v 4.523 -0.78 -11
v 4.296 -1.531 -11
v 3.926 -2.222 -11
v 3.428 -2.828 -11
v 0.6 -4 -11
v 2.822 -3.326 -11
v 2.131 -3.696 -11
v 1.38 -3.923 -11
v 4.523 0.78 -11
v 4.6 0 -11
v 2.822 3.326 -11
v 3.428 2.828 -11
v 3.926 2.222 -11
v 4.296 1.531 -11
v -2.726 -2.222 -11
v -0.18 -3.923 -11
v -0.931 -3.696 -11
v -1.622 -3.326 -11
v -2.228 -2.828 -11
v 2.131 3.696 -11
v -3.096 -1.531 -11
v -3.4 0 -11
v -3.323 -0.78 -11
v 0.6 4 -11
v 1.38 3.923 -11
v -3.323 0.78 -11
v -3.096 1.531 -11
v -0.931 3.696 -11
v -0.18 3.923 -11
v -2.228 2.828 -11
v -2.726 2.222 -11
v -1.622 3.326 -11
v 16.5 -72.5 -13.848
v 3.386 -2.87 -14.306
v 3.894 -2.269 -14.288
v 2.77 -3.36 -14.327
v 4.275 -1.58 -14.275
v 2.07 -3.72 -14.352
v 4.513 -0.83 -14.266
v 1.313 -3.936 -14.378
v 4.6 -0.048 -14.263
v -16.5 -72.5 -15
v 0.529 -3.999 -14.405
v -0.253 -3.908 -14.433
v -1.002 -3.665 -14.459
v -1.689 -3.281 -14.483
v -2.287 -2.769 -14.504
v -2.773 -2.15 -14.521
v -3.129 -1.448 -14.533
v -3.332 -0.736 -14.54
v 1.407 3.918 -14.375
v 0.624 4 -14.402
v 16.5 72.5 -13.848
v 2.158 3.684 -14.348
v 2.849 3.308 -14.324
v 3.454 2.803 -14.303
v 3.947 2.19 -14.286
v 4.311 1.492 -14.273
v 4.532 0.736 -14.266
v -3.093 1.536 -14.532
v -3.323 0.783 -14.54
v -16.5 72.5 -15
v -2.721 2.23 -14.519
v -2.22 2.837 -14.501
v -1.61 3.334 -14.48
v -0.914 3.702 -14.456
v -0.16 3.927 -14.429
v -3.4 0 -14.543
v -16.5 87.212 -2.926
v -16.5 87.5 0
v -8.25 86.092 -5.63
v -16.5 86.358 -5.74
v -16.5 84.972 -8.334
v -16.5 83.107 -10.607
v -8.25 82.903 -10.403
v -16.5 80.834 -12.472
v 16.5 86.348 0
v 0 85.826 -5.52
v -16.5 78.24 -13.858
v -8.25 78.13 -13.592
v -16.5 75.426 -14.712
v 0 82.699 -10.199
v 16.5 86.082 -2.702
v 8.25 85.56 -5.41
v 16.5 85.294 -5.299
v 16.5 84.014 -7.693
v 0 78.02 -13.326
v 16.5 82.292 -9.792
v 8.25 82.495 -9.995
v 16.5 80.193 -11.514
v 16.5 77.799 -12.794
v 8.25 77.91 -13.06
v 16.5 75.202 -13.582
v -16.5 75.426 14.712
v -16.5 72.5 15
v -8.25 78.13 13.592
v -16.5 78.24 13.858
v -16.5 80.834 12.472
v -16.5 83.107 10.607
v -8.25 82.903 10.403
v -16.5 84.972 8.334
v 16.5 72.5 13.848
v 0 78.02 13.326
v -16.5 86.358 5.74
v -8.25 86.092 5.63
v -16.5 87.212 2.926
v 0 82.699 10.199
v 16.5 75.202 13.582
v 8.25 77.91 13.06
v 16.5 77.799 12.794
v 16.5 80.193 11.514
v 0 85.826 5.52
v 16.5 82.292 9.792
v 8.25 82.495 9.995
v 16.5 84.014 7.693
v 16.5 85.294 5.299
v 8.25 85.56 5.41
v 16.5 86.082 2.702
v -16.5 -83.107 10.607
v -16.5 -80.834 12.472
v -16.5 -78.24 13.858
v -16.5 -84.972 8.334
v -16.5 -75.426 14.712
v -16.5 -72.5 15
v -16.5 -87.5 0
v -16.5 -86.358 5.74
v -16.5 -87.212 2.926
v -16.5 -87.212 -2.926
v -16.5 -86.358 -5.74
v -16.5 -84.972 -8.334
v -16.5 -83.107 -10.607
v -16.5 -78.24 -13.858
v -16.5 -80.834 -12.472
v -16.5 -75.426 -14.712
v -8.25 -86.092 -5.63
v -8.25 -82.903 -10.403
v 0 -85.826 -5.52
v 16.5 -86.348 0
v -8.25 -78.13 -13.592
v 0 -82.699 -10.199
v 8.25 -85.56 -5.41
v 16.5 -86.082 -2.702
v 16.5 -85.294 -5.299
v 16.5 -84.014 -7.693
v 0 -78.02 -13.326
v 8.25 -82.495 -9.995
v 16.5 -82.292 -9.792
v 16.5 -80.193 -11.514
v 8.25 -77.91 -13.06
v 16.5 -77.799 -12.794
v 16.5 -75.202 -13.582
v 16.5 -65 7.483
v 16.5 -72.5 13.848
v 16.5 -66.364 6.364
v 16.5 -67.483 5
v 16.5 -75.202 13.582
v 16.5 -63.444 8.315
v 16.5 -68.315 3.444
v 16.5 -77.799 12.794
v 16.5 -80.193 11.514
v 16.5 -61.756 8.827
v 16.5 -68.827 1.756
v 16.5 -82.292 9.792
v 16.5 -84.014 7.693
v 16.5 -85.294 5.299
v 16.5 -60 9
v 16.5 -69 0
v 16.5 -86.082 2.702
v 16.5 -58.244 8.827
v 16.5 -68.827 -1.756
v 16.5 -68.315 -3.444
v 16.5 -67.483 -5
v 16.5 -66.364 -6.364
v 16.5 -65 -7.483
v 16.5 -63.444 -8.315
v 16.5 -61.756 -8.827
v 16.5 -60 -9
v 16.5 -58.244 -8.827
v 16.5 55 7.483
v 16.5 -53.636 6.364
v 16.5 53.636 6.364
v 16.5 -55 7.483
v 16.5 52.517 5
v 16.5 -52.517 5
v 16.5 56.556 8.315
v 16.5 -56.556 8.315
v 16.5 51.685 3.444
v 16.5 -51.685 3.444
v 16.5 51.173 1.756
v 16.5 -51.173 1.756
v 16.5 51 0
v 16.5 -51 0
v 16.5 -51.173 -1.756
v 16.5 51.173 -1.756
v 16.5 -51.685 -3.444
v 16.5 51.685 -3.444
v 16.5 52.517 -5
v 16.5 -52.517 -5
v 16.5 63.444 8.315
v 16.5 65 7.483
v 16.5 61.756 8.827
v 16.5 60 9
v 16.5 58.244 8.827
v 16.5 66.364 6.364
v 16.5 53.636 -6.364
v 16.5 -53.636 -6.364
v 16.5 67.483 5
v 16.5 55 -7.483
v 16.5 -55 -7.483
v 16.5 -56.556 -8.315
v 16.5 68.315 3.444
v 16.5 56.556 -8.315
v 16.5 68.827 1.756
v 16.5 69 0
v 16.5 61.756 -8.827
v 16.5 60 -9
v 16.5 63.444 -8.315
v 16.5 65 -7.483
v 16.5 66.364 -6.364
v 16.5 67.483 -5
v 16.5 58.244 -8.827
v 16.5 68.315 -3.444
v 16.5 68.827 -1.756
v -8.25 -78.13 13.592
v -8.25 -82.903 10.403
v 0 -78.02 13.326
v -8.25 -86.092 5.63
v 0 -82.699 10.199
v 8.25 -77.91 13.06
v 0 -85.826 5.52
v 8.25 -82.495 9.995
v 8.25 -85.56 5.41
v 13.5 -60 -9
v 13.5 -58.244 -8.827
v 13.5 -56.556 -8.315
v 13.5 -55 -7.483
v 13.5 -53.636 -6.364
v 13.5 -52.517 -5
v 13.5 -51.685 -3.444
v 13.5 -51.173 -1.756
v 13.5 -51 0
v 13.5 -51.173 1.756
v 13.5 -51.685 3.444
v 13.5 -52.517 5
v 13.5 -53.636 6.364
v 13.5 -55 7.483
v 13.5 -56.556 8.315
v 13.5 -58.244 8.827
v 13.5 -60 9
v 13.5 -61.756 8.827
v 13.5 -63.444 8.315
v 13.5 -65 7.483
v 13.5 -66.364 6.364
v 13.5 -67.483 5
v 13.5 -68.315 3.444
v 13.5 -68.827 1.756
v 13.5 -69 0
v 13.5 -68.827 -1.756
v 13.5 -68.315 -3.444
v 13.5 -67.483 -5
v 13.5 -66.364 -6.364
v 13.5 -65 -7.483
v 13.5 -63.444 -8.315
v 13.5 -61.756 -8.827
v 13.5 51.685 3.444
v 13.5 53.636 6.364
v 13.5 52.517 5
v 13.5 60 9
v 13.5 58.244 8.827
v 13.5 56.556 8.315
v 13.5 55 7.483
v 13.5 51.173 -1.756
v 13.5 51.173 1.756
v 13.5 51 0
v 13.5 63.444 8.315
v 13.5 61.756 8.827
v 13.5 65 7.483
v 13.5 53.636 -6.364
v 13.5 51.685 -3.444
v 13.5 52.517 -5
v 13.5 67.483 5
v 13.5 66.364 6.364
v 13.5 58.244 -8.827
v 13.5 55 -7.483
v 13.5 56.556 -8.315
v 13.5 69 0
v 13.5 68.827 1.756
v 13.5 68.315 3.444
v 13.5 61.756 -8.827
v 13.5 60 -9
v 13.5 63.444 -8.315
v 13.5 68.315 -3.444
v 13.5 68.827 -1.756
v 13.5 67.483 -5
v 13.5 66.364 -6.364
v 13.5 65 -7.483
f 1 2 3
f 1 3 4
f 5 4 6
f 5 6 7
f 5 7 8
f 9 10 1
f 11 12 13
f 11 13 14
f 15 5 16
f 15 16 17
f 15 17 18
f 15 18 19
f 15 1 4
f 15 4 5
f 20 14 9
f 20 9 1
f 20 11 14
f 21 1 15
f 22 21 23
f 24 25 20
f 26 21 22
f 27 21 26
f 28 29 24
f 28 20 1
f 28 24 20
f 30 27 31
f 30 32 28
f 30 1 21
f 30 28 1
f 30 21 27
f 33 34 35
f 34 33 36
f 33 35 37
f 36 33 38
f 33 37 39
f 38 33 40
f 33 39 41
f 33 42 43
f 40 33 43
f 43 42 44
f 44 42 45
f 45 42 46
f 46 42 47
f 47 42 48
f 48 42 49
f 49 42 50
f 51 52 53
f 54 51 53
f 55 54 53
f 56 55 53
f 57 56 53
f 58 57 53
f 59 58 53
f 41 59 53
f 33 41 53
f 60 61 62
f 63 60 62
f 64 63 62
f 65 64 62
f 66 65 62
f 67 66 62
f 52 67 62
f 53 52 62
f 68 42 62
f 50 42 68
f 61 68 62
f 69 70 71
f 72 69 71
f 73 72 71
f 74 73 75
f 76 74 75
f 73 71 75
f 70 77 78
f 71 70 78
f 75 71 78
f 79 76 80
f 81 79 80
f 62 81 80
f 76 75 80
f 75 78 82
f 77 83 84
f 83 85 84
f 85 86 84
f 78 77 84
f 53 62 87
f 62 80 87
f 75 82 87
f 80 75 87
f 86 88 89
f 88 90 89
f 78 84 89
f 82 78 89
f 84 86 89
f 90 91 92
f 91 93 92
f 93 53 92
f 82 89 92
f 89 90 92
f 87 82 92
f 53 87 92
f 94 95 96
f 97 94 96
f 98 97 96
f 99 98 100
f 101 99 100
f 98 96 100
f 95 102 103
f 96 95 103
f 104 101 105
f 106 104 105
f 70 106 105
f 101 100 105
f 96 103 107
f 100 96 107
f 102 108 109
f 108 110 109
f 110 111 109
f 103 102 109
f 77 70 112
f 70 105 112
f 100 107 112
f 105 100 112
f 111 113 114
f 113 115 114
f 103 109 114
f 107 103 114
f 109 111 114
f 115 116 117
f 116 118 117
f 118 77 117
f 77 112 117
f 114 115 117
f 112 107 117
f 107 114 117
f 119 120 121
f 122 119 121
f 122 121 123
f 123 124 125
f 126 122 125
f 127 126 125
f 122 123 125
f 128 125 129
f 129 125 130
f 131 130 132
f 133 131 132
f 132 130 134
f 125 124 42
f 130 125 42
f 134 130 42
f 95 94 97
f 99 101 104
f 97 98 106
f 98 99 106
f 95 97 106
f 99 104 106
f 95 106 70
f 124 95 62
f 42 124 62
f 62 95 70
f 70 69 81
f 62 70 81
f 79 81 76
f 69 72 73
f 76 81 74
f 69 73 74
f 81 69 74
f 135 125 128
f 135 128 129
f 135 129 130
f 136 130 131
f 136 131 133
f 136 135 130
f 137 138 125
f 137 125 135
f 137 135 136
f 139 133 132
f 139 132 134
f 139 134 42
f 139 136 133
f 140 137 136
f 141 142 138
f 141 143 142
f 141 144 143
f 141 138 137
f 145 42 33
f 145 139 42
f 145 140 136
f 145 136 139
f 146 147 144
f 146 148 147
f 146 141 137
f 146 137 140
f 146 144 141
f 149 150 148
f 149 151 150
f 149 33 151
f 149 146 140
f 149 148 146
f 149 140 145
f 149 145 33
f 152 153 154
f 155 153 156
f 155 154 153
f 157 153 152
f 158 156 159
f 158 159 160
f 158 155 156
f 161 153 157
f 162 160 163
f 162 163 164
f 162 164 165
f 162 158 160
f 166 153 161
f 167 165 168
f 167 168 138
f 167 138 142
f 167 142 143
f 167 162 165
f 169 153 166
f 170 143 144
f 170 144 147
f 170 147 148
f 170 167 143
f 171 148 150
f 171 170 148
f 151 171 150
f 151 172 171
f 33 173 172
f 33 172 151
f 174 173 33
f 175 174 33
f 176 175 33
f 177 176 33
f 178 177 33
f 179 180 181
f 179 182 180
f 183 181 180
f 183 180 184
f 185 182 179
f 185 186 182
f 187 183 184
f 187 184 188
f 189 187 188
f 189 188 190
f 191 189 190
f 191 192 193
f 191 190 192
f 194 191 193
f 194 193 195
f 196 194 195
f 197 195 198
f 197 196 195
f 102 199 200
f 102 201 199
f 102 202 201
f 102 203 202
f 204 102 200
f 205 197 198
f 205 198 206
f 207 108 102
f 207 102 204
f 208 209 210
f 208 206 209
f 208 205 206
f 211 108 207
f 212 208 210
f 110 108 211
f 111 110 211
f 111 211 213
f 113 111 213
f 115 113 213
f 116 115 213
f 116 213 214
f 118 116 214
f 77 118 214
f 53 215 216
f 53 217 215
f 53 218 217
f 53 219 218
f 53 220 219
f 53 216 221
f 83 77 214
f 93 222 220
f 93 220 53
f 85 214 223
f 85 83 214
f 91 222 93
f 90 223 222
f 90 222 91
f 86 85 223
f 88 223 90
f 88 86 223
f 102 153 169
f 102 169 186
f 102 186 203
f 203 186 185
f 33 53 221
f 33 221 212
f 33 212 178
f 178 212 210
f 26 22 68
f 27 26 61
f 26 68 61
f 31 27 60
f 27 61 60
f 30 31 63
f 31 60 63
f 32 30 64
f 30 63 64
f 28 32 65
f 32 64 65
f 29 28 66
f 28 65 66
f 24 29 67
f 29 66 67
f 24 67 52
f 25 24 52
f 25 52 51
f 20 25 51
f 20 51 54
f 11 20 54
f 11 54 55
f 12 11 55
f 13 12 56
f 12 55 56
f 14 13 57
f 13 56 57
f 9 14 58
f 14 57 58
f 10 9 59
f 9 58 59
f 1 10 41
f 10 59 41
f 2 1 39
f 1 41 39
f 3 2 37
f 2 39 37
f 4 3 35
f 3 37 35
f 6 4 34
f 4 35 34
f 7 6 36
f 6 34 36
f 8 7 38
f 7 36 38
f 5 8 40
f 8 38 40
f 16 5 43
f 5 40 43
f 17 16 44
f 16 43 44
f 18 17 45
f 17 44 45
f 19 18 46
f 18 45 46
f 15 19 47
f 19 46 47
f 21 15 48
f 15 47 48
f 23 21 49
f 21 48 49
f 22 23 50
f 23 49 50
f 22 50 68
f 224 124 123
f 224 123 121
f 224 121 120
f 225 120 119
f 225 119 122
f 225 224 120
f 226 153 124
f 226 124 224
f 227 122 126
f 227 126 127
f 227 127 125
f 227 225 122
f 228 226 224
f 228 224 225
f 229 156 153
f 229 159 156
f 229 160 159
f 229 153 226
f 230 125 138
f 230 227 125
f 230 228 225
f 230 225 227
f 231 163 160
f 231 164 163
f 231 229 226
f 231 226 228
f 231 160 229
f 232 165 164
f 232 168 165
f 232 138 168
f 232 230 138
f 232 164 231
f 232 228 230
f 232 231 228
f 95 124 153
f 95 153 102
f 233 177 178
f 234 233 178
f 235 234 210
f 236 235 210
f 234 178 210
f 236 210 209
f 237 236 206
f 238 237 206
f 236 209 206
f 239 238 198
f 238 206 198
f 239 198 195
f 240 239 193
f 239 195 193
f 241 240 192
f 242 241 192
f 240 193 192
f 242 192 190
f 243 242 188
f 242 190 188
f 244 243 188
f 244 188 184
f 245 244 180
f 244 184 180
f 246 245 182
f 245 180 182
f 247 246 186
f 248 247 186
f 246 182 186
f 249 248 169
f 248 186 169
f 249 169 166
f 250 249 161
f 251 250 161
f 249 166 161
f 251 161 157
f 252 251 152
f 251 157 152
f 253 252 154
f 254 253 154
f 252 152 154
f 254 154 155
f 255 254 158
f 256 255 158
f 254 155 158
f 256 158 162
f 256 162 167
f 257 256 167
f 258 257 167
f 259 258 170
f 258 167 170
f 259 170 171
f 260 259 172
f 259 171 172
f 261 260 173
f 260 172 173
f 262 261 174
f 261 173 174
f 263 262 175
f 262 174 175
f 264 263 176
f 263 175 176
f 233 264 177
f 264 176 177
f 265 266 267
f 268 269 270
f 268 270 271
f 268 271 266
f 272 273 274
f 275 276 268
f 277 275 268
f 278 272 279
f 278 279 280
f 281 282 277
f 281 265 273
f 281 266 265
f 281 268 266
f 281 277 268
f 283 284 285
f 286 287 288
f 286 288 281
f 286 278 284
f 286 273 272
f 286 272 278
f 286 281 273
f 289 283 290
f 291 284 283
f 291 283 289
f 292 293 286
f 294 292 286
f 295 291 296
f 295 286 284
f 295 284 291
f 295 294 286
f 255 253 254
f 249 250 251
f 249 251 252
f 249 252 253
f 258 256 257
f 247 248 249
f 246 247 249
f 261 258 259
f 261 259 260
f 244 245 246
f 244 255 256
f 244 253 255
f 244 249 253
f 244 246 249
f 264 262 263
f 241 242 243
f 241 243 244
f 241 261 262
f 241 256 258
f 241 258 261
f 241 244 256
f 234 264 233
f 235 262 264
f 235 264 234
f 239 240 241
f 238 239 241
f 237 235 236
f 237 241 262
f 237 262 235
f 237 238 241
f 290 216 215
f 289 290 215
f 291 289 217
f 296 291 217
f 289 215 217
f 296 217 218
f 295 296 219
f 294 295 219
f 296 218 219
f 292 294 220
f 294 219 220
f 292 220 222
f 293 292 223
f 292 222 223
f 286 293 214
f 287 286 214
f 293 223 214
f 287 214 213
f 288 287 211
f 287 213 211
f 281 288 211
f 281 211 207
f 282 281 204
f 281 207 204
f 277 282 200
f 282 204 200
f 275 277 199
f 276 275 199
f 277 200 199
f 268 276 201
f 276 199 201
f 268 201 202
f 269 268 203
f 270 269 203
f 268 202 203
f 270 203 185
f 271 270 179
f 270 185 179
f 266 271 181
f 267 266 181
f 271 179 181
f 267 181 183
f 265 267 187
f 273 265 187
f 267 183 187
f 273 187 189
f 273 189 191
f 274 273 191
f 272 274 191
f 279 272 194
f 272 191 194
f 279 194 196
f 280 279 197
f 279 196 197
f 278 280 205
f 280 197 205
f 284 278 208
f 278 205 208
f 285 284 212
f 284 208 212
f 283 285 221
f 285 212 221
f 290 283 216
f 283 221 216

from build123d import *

# Parameters (mm, degrees)
BOSS_EXTRUDE1_DEPTH      = 16.5
BOSS_EXTRUDE1_DEPTH_BACK = 16.5
SKETCH1_W                = 30
SKETCH1_H                = 175
SKETCH2_R                = 9
CUT_EXTRUDE1_DEPTH       = 3
FILLET1_R                = 15
SKETCH3_R                = 4
CUT_EXTRUDE2_DEPTH       = 4
DRAFT1_ANGLE             = -2


with BuildPart() as part:
    # Sketch1 → Boss-Extrude1 (new, two sides: drawn at the far end of the back side and taken through both)
    with BuildSketch(Plane(origin=(0, 0, 0), x_dir=(0, 0, -1), z_dir=(1, 0, 0)).offset(-BOSS_EXTRUDE1_DEPTH_BACK)):
        Rectangle(SKETCH1_W, SKETCH1_H)
    extrude(amount=BOSS_EXTRUDE1_DEPTH + BOSS_EXTRUDE1_DEPTH_BACK)

    # Sketch2 → Cut-Extrude1 (cut)
    with BuildSketch(Plane(origin=(16.5, 0, 0), x_dir=(0, 0, -1), z_dir=(1, 0, 0))):
        with Locations((0, -60)):
            Circle(SKETCH2_R)
        with Locations((0, 60)):
            Circle(SKETCH2_R)
    extrude(amount=-CUT_EXTRUDE1_DEPTH, mode=Mode.SUBTRACT)

    # Fillet1
    fillet1_edges = [part.edges().sort_by_distance(p)[0] for p in [
        (0, 87.5, -15),
        (0, 87.5, 15),
        (0, -87.5, -15),
        (0, -87.5, 15),
    ]]
    fillet(fillet1_edges, radius=FILLET1_R - 0.0001)  # a hair under: the kernel refuses the full size

    # Sketch3 → Cut-Extrude2 (cut)
    with BuildSketch(Plane(origin=(0, 0, -15), x_dir=(-1, 0, 0), z_dir=(0, 0, -1))):
        with Locations((-0.6, 0)):
            Circle(SKETCH3_R)
    extrude(amount=-CUT_EXTRUDE2_DEPTH, mode=Mode.SUBTRACT)

    # Draft1
    draft1_faces = [part.faces().sort_by_distance(p)[0] for p in [
        (0, -83.106631007, -10.606631007),
        (15.012920379, 0, -15),
        (0, 83.106631007, -10.606631007),
        (0, 83.106631007, 10.606631007),
        (0, 0, 15),
        (0, -83.106631007, 10.606631007),
    ]]
    draft(draft1_faces, Plane(origin=(-16.5, 0, 0), x_dir=(0, 0, -1), z_dir=(-1, 0, 0)), DRAFT1_ANGLE)


solid = part.part
